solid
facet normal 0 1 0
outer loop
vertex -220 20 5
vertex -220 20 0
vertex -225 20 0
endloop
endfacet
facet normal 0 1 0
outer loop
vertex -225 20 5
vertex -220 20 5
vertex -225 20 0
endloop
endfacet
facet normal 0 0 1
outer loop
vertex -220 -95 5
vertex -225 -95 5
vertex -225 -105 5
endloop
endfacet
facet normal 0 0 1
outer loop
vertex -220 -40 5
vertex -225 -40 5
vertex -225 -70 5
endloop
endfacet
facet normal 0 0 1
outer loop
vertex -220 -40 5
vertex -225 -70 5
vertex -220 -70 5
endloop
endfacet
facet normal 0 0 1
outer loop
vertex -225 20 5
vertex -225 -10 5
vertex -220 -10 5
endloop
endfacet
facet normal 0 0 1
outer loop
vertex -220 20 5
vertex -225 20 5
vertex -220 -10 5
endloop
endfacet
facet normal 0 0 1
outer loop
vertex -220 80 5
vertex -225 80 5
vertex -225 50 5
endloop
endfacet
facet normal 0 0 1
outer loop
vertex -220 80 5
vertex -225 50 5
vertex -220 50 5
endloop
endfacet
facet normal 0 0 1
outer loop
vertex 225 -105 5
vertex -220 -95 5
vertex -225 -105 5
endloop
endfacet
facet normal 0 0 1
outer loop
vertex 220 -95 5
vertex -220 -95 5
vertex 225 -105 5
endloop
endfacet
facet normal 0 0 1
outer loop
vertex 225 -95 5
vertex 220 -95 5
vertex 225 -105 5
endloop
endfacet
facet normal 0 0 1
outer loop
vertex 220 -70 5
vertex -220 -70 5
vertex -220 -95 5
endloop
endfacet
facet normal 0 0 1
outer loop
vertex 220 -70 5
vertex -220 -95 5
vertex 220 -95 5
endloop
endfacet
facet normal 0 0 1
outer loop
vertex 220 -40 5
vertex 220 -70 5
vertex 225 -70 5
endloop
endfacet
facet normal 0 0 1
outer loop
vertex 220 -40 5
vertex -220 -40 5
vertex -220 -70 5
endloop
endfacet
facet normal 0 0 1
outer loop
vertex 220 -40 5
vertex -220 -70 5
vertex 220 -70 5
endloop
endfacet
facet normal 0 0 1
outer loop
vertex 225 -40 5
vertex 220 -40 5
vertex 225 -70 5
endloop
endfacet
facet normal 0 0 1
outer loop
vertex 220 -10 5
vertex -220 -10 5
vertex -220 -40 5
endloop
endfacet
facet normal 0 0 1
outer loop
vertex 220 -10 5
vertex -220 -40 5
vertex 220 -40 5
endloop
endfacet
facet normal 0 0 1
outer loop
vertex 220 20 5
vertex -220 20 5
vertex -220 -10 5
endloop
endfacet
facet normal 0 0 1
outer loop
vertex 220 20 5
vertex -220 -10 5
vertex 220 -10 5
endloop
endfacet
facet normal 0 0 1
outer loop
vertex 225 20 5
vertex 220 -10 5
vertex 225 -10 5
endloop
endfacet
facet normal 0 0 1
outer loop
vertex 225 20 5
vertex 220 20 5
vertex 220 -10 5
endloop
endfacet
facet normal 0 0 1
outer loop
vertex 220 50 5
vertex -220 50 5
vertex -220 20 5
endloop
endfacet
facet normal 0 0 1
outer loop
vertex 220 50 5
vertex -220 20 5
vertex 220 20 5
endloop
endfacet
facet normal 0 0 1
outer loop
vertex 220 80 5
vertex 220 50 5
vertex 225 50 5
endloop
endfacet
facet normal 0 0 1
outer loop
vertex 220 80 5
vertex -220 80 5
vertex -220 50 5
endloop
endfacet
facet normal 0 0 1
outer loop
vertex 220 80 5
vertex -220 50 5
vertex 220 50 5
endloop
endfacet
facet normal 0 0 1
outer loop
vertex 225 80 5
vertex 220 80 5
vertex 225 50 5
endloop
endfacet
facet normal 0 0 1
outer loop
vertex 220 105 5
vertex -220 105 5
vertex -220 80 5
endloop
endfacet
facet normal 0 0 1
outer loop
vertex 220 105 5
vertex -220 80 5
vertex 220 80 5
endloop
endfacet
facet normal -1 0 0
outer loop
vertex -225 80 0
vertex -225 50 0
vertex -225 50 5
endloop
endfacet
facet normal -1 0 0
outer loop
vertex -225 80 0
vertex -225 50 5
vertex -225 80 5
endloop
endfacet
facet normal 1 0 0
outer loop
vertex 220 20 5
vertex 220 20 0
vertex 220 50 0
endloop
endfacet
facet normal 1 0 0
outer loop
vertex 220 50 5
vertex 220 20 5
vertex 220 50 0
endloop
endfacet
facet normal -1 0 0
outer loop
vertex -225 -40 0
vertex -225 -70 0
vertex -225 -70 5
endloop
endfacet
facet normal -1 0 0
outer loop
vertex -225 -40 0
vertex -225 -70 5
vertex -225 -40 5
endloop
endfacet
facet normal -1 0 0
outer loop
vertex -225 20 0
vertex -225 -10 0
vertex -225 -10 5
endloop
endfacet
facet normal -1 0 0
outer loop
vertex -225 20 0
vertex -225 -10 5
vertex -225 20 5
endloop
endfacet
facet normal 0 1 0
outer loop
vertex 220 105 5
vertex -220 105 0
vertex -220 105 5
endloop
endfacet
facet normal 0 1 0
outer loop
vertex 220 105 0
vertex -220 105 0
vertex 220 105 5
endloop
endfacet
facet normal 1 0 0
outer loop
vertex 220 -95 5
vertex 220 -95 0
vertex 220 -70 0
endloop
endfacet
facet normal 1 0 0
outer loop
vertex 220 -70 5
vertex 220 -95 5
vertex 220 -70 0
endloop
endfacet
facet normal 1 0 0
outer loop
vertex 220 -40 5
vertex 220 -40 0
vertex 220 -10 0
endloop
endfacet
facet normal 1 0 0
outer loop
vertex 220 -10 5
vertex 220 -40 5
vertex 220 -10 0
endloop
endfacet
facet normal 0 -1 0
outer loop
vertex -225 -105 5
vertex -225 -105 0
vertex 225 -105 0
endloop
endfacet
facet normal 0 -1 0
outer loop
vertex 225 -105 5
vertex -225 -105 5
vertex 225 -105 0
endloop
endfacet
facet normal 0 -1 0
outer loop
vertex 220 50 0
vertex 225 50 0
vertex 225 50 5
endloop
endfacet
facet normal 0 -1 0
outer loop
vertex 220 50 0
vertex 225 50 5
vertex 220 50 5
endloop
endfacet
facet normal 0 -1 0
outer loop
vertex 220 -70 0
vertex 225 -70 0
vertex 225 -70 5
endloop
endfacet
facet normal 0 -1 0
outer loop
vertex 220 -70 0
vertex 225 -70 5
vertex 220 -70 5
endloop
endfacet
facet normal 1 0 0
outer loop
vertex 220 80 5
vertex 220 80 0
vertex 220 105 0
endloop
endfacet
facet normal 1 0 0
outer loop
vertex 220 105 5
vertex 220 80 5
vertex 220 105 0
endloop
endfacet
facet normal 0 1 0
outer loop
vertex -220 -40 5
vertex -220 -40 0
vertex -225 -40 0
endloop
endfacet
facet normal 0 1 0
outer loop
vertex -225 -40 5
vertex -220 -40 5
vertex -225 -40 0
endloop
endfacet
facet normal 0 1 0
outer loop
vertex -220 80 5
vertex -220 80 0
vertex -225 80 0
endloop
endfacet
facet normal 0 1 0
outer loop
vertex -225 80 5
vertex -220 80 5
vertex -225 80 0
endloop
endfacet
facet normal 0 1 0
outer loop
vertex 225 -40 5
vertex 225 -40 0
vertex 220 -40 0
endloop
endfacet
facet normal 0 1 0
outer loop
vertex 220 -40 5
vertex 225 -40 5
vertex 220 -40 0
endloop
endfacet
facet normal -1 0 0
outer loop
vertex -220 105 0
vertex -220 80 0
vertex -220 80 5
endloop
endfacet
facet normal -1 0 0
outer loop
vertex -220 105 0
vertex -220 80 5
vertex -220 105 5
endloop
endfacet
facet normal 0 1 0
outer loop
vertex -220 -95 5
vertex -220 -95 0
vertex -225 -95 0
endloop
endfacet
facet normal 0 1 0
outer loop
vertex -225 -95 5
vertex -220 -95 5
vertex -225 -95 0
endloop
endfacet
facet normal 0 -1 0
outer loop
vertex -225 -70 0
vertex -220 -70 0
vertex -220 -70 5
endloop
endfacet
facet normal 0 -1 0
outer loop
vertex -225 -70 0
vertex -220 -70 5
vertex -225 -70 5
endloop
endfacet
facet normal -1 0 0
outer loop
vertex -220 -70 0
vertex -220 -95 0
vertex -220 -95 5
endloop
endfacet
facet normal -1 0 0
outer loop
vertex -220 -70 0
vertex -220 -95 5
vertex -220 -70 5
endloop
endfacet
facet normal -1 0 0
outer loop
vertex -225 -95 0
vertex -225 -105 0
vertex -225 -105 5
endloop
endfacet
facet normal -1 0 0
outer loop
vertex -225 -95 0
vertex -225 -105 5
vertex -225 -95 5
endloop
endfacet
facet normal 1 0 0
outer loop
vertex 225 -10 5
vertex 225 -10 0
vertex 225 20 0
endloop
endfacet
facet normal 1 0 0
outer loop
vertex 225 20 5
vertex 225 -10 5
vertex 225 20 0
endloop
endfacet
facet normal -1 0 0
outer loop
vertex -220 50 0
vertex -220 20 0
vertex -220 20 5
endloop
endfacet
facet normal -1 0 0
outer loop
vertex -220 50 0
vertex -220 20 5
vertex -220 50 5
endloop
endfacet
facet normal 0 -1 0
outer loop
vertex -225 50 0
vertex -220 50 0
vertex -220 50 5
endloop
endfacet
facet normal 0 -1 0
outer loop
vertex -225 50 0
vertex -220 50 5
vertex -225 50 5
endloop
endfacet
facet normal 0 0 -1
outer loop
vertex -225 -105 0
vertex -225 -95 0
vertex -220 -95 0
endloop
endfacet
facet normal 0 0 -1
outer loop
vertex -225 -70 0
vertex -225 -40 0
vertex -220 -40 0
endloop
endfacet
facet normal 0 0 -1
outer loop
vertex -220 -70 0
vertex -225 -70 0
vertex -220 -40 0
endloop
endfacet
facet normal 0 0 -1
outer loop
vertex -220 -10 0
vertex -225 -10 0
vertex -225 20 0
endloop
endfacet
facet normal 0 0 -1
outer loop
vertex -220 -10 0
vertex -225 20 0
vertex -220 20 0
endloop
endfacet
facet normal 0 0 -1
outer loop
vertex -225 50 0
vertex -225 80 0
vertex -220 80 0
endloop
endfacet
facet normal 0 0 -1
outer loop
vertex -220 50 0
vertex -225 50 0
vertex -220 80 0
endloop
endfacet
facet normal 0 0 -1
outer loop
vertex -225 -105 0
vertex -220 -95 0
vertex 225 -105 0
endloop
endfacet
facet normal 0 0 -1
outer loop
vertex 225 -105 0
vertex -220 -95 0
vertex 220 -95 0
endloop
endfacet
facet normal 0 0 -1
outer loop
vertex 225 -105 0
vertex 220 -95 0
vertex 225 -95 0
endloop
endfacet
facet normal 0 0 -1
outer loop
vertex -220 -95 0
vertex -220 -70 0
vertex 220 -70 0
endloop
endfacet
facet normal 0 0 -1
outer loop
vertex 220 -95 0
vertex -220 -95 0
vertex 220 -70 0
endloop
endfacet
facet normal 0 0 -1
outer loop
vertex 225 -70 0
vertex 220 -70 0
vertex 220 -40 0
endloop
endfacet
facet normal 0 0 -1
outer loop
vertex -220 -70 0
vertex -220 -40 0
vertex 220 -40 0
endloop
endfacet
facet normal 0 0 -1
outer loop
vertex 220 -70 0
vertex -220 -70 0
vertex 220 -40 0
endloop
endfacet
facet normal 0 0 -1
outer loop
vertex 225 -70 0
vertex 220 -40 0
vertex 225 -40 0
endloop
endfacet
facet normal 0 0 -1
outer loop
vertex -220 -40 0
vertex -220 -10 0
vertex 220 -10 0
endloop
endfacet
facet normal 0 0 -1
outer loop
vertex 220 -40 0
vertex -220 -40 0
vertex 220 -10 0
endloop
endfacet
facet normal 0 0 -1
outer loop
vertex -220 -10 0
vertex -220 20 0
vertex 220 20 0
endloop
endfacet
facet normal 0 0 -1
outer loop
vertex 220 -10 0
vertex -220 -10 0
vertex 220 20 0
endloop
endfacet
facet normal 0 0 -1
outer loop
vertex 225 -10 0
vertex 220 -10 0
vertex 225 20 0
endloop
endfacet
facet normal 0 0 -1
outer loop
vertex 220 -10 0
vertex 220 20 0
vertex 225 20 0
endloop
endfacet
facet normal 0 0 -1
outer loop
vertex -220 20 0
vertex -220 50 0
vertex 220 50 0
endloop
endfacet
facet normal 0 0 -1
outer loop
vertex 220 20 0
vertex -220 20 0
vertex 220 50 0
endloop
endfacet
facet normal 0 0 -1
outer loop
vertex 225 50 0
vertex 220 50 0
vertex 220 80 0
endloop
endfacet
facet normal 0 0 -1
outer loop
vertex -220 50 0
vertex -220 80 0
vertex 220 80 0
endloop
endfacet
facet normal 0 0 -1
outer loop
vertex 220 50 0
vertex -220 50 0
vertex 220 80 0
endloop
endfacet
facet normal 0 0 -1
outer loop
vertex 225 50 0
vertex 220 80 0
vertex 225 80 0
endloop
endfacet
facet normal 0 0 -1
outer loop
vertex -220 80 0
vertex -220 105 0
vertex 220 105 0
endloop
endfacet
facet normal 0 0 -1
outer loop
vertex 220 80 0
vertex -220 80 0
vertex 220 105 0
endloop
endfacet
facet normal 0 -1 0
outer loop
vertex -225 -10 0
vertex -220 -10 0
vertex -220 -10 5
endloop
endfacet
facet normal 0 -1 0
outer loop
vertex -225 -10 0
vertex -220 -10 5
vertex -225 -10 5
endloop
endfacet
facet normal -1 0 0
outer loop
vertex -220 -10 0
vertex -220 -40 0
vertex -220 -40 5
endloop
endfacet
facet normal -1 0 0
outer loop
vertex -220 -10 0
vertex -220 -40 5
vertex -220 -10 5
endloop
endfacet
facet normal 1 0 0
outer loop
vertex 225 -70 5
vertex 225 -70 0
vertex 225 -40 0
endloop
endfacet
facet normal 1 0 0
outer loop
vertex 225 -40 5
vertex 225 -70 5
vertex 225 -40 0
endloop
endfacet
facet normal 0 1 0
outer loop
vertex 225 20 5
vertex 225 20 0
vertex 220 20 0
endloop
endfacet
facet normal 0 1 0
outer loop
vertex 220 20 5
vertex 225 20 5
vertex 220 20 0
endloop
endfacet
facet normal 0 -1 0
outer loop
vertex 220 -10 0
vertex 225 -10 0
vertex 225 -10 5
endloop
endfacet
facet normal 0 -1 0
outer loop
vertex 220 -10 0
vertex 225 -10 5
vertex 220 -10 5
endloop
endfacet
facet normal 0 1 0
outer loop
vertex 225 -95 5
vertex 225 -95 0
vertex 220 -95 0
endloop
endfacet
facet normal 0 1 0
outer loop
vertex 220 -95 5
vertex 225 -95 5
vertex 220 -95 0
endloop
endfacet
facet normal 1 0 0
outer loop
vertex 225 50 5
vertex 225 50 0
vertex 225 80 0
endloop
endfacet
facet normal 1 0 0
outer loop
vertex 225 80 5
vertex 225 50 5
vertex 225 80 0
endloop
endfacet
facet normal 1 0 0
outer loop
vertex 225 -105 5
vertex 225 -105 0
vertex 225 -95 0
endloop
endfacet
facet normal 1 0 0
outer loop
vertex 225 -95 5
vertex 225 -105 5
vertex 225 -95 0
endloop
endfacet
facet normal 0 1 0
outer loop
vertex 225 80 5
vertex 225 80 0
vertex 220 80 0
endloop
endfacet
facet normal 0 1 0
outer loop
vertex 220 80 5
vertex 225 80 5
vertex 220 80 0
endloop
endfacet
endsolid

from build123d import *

# Parameters (mm, degrees)
SKETCH1_W           = 450
SKETCH1_H           = 210
BOSS_EXTRUDE1_DEPTH = 5
SKETCH3_W           = 65.821391225
SKETCH3_H           = 25
SKETCH3_W_2         = 143.228691138
SKETCH3_H_2         = 30
SKETCH3_W_3         = 192.205874683
SKETCH3_W_4         = 194.707934706
SKETCH3_W_5         = 70.821391225
SKETCH3_W_6         = 148.228691138
SKETCH3_W_7         = 194.705874683
SKETCH3_W_8         = 199.707934706
CUT_EXTRUDE1_DEPTH  = 6


with BuildPart() as part:
    # Sketch1 → Boss-Extrude1 (new body)
    with BuildSketch(Plane.XY):
        Rectangle(SKETCH1_W, SKETCH1_H)
    extrude(amount=BOSS_EXTRUDE1_DEPTH)

    # Sketch3 → Cut-Extrude1 (cut, through all)
    with BuildSketch(Plane(origin=(0, 0, 0), x_dir=(-1, 0, 0), z_dir=(0, 0, -1))):
        with Locations((-252.910695613, 92.5)):
            Rectangle(SKETCH3_W, SKETCH3_H)
        with Locations((-291.614345569, 35)):
            Rectangle(SKETCH3_W_2, SKETCH3_H_2)
        with Locations((-316.102937342, -25)):
            Rectangle(SKETCH3_W_3, SKETCH3_H_2)
        with Locations((-317.353967353, -82.5)):
            Rectangle(SKETCH3_W_4, SKETCH3_H)
        with Locations((255.410695613, 92.5)):
            Rectangle(SKETCH3_W_5, SKETCH3_H)
        with Locations((294.114345569, 35)):
            Rectangle(SKETCH3_W_6, SKETCH3_H_2)
        with Locations((317.352937342, -25)):
            Rectangle(SKETCH3_W_7, SKETCH3_H_2)
        with Locations((319.853967353, -82.5)):
            Rectangle(SKETCH3_W_8, SKETCH3_H)
    extrude(amount=-CUT_EXTRUDE1_DEPTH, mode=Mode.SUBTRACT)


solid = part.part
